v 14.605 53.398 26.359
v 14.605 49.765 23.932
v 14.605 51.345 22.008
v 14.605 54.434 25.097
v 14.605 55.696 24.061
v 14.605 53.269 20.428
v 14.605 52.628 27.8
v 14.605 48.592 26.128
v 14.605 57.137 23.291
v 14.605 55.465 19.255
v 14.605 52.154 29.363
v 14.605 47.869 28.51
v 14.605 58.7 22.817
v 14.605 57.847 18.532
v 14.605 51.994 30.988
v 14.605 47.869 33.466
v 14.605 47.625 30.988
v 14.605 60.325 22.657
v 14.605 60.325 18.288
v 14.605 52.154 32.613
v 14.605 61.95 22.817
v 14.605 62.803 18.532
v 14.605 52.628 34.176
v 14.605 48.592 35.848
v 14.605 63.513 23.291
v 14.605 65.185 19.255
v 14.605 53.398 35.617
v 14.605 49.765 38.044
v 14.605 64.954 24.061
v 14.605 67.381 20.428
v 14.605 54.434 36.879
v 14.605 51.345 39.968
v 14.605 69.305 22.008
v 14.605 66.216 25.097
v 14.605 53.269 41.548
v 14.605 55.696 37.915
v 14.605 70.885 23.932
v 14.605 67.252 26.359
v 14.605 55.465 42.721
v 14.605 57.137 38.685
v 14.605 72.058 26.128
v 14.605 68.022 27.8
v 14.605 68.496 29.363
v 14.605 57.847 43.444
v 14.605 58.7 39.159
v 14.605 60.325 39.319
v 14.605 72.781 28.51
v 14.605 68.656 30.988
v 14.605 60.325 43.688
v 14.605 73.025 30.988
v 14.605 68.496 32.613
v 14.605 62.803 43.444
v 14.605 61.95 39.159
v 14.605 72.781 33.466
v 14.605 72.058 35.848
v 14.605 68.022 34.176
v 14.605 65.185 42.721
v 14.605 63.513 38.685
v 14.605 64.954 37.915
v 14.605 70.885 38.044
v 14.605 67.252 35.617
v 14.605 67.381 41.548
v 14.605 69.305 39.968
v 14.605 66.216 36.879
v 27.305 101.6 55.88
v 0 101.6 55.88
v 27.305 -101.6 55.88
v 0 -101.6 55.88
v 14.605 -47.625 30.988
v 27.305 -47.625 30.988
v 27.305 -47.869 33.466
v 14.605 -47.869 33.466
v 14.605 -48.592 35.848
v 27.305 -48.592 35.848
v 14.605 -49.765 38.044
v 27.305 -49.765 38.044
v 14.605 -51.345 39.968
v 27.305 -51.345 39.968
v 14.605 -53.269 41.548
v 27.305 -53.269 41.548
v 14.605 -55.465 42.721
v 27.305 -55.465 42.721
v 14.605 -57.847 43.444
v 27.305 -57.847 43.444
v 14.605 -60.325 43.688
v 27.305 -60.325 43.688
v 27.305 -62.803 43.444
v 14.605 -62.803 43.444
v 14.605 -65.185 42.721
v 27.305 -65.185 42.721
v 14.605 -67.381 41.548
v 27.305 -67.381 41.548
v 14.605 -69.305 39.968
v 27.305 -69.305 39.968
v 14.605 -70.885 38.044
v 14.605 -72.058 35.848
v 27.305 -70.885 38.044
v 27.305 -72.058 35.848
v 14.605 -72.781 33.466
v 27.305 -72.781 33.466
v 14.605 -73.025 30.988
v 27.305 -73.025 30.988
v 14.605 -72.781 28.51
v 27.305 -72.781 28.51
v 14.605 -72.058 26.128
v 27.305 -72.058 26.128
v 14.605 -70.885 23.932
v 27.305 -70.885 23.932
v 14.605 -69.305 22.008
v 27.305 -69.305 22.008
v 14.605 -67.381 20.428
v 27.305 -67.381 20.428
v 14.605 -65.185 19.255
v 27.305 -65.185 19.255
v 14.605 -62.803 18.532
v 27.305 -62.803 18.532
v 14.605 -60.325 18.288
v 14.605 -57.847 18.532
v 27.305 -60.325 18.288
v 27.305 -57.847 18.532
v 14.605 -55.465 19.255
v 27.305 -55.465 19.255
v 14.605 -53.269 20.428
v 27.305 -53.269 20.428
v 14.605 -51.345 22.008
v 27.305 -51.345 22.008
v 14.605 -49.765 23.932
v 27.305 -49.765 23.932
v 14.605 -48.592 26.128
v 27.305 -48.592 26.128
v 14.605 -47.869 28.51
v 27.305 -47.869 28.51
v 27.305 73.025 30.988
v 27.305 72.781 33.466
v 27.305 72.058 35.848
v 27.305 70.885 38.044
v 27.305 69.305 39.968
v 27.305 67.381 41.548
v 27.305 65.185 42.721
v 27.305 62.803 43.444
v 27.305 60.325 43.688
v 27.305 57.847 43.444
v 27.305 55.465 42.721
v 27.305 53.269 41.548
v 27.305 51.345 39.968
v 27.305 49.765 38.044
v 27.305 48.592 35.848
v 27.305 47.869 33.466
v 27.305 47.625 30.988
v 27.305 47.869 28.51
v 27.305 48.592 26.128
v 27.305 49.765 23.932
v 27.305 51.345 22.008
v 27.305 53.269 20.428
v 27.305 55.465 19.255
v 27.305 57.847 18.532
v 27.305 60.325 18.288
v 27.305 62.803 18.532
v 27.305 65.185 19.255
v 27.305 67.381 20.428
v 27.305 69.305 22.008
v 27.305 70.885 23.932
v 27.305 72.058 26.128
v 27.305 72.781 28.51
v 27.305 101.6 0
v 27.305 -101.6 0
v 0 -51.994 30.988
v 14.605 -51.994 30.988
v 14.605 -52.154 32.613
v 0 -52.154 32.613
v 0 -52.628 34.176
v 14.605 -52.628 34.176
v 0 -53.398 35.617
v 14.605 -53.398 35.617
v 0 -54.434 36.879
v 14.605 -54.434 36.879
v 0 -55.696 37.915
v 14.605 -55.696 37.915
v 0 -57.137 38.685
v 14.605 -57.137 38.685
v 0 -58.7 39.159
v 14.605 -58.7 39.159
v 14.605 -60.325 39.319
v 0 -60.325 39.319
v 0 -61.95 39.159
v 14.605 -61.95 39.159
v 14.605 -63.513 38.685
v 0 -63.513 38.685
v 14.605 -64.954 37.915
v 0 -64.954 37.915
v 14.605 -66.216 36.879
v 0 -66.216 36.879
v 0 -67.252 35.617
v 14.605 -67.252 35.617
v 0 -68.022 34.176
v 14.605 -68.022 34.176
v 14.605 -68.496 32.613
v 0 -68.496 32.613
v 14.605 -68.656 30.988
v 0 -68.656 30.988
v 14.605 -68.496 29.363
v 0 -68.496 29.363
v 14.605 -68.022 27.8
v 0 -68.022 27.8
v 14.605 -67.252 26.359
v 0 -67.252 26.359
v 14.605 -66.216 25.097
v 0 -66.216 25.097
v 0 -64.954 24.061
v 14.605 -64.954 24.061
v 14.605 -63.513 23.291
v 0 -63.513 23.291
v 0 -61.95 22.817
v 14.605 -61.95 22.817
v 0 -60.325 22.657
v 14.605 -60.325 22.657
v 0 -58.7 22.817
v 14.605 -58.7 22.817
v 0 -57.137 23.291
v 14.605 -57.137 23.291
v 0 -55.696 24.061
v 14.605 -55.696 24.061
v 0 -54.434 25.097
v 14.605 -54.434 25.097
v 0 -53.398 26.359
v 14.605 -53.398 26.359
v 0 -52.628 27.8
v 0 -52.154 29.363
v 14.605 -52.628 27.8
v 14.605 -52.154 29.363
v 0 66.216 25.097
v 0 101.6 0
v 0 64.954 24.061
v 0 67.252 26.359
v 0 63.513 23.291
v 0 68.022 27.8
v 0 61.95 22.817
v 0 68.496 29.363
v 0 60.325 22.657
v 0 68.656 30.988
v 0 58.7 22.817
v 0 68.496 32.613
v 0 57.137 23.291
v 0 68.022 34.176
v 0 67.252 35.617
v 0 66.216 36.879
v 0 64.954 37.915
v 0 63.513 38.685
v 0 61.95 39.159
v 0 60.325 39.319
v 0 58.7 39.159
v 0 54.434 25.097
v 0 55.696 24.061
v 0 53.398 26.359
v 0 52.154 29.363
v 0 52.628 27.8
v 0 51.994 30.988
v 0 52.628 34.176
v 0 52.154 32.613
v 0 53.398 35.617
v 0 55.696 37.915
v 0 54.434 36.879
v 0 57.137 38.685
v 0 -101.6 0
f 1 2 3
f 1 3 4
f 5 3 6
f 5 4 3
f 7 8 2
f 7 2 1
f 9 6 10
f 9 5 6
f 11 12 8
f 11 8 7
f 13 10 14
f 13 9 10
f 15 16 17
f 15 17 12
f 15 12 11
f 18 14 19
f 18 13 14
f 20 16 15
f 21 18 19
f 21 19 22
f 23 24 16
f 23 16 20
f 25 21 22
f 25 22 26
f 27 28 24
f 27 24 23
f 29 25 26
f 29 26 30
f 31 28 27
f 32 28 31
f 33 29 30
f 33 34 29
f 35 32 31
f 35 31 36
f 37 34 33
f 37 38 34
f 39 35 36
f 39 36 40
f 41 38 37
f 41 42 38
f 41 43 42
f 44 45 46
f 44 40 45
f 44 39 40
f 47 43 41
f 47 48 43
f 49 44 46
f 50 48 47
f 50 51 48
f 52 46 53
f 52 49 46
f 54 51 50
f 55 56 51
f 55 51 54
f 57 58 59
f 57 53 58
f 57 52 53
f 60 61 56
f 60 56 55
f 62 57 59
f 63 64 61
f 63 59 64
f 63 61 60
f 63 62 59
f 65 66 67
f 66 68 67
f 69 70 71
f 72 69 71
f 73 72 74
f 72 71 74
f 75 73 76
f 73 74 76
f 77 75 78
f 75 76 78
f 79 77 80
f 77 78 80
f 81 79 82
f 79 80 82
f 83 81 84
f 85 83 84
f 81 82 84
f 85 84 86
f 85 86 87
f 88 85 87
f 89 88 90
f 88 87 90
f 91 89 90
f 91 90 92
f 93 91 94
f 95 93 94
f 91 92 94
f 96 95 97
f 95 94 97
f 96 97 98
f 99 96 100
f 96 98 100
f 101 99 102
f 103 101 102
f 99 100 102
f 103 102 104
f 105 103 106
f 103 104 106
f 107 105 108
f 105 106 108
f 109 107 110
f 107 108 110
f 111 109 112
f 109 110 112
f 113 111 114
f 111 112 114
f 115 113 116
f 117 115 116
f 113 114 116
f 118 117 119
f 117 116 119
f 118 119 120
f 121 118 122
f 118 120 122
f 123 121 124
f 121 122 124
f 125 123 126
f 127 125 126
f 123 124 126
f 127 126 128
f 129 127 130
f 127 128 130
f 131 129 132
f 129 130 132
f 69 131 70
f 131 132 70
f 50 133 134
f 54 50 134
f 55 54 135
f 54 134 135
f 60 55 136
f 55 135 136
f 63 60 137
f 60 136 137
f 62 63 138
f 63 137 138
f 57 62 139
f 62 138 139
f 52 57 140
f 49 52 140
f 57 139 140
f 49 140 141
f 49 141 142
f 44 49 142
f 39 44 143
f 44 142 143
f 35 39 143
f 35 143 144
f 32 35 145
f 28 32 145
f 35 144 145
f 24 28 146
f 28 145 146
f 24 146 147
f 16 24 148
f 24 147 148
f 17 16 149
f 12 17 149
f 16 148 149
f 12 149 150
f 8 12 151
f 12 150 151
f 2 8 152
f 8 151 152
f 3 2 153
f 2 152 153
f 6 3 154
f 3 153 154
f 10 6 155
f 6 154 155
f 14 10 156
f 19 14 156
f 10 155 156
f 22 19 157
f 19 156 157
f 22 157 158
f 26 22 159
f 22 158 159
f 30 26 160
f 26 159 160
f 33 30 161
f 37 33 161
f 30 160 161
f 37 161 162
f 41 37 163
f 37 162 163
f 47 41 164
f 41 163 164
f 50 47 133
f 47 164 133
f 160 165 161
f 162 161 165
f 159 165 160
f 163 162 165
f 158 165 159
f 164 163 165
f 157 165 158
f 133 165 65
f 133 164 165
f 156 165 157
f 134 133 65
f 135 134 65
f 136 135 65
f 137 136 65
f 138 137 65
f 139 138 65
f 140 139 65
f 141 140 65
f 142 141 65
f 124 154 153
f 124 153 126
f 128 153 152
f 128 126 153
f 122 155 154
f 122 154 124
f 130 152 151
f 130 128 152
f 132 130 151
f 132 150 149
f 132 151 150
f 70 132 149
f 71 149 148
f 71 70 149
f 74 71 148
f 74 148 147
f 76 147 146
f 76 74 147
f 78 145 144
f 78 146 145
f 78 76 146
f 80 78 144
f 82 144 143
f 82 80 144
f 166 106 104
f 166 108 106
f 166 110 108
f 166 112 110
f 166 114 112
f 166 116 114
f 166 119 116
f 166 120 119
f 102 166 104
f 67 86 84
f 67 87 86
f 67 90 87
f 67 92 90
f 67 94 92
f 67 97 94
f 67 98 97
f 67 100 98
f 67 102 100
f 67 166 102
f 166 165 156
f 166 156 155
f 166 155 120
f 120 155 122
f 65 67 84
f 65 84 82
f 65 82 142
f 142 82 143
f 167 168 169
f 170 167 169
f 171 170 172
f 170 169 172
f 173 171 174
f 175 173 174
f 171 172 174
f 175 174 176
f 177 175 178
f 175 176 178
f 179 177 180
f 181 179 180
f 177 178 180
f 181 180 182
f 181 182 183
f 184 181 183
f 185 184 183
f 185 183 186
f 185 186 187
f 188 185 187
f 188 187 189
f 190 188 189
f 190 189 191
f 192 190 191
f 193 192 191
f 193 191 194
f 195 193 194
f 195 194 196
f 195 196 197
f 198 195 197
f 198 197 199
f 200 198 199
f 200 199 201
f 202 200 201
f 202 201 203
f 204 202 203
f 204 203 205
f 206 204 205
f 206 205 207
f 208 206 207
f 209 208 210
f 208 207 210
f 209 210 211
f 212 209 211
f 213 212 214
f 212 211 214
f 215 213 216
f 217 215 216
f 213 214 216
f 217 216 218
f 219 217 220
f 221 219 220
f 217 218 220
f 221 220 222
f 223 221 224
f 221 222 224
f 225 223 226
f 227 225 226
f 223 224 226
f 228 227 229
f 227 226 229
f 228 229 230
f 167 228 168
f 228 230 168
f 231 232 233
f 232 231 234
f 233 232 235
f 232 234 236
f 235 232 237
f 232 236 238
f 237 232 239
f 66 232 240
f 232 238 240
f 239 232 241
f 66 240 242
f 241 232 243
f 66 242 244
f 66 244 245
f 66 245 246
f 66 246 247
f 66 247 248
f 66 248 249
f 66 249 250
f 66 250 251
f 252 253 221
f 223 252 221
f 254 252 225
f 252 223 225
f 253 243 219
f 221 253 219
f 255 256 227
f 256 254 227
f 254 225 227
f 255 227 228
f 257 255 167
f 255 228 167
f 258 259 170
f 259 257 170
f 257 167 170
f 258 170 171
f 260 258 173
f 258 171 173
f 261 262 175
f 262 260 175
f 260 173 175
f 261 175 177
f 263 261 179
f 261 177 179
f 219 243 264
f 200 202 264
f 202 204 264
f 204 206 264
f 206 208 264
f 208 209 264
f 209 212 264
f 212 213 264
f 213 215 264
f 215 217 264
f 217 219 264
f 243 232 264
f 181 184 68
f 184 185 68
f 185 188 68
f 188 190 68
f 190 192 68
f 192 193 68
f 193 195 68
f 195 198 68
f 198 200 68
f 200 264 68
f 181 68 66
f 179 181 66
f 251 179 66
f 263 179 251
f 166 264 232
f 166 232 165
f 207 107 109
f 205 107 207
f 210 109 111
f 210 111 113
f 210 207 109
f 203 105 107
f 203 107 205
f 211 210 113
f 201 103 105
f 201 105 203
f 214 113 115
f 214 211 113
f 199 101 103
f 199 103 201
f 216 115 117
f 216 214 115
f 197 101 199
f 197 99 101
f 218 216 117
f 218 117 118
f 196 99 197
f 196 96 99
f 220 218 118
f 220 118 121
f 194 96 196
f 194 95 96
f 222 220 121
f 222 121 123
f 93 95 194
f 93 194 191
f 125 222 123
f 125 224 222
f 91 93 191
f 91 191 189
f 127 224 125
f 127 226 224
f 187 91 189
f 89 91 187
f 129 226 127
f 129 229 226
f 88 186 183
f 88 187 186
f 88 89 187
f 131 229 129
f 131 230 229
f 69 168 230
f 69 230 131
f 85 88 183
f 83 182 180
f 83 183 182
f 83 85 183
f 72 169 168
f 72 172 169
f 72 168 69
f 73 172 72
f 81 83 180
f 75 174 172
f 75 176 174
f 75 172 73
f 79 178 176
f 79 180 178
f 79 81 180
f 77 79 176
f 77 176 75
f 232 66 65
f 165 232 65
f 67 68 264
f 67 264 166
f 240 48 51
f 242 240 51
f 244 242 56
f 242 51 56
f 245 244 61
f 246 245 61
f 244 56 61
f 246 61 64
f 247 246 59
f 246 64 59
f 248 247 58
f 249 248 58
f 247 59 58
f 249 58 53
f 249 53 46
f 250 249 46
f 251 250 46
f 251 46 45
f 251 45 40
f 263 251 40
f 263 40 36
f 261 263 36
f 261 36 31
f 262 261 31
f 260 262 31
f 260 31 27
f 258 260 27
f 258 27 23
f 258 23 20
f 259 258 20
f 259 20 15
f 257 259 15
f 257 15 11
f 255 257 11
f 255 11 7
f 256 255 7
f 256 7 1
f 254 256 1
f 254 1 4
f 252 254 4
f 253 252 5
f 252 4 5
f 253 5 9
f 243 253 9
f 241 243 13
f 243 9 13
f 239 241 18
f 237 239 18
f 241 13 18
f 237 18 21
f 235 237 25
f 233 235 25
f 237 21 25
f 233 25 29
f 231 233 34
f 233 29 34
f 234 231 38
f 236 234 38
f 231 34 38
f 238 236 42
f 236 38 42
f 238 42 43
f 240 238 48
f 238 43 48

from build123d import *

# Parameters (mm, degrees)
F0_W     = 27.305
F0_H     = 55.88
F1_DEPTH = 101.6
F2_R     = 8.3312
F3_DEPTH = 38.1
F4_R     = 12.7
F4_R_2   = 8.3312
F5_DEPTH = 12.7


with BuildPart() as f1:
    # F0 (on Front) → F1 (new body, symmetric)
    with BuildSketch(Plane.XZ):
        with Locations((13.6525, 27.94)):
            Rectangle(F0_W, F0_H)
    extrude(amount=F1_DEPTH, both=True)

    # F2 (on face) → F3 (cut)
    with BuildSketch(Plane.YZ.offset(27.305)):
        with Locations((-60.325, 30.988)):
            Circle(F2_R)
        with Locations((60.325, 30.988)):
            Circle(F2_R)
    extrude(amount=-F3_DEPTH, mode=Mode.SUBTRACT)

    # F4 (on face) → F5 (cut)
    with BuildSketch(Plane.YZ.offset(27.305)):
        with Locations((-60.325, 30.988)):
            Circle(F4_R)
        with Locations((-60.325, 30.988)):
            Circle(F4_R_2, mode=Mode.SUBTRACT)
        with Locations((60.325, 30.988)):
            Circle(F4_R)
        with Locations((60.325, 30.988)):
            Circle(F4_R_2, mode=Mode.SUBTRACT)
    extrude(amount=-F5_DEPTH, mode=Mode.SUBTRACT)


solid = f1.part
